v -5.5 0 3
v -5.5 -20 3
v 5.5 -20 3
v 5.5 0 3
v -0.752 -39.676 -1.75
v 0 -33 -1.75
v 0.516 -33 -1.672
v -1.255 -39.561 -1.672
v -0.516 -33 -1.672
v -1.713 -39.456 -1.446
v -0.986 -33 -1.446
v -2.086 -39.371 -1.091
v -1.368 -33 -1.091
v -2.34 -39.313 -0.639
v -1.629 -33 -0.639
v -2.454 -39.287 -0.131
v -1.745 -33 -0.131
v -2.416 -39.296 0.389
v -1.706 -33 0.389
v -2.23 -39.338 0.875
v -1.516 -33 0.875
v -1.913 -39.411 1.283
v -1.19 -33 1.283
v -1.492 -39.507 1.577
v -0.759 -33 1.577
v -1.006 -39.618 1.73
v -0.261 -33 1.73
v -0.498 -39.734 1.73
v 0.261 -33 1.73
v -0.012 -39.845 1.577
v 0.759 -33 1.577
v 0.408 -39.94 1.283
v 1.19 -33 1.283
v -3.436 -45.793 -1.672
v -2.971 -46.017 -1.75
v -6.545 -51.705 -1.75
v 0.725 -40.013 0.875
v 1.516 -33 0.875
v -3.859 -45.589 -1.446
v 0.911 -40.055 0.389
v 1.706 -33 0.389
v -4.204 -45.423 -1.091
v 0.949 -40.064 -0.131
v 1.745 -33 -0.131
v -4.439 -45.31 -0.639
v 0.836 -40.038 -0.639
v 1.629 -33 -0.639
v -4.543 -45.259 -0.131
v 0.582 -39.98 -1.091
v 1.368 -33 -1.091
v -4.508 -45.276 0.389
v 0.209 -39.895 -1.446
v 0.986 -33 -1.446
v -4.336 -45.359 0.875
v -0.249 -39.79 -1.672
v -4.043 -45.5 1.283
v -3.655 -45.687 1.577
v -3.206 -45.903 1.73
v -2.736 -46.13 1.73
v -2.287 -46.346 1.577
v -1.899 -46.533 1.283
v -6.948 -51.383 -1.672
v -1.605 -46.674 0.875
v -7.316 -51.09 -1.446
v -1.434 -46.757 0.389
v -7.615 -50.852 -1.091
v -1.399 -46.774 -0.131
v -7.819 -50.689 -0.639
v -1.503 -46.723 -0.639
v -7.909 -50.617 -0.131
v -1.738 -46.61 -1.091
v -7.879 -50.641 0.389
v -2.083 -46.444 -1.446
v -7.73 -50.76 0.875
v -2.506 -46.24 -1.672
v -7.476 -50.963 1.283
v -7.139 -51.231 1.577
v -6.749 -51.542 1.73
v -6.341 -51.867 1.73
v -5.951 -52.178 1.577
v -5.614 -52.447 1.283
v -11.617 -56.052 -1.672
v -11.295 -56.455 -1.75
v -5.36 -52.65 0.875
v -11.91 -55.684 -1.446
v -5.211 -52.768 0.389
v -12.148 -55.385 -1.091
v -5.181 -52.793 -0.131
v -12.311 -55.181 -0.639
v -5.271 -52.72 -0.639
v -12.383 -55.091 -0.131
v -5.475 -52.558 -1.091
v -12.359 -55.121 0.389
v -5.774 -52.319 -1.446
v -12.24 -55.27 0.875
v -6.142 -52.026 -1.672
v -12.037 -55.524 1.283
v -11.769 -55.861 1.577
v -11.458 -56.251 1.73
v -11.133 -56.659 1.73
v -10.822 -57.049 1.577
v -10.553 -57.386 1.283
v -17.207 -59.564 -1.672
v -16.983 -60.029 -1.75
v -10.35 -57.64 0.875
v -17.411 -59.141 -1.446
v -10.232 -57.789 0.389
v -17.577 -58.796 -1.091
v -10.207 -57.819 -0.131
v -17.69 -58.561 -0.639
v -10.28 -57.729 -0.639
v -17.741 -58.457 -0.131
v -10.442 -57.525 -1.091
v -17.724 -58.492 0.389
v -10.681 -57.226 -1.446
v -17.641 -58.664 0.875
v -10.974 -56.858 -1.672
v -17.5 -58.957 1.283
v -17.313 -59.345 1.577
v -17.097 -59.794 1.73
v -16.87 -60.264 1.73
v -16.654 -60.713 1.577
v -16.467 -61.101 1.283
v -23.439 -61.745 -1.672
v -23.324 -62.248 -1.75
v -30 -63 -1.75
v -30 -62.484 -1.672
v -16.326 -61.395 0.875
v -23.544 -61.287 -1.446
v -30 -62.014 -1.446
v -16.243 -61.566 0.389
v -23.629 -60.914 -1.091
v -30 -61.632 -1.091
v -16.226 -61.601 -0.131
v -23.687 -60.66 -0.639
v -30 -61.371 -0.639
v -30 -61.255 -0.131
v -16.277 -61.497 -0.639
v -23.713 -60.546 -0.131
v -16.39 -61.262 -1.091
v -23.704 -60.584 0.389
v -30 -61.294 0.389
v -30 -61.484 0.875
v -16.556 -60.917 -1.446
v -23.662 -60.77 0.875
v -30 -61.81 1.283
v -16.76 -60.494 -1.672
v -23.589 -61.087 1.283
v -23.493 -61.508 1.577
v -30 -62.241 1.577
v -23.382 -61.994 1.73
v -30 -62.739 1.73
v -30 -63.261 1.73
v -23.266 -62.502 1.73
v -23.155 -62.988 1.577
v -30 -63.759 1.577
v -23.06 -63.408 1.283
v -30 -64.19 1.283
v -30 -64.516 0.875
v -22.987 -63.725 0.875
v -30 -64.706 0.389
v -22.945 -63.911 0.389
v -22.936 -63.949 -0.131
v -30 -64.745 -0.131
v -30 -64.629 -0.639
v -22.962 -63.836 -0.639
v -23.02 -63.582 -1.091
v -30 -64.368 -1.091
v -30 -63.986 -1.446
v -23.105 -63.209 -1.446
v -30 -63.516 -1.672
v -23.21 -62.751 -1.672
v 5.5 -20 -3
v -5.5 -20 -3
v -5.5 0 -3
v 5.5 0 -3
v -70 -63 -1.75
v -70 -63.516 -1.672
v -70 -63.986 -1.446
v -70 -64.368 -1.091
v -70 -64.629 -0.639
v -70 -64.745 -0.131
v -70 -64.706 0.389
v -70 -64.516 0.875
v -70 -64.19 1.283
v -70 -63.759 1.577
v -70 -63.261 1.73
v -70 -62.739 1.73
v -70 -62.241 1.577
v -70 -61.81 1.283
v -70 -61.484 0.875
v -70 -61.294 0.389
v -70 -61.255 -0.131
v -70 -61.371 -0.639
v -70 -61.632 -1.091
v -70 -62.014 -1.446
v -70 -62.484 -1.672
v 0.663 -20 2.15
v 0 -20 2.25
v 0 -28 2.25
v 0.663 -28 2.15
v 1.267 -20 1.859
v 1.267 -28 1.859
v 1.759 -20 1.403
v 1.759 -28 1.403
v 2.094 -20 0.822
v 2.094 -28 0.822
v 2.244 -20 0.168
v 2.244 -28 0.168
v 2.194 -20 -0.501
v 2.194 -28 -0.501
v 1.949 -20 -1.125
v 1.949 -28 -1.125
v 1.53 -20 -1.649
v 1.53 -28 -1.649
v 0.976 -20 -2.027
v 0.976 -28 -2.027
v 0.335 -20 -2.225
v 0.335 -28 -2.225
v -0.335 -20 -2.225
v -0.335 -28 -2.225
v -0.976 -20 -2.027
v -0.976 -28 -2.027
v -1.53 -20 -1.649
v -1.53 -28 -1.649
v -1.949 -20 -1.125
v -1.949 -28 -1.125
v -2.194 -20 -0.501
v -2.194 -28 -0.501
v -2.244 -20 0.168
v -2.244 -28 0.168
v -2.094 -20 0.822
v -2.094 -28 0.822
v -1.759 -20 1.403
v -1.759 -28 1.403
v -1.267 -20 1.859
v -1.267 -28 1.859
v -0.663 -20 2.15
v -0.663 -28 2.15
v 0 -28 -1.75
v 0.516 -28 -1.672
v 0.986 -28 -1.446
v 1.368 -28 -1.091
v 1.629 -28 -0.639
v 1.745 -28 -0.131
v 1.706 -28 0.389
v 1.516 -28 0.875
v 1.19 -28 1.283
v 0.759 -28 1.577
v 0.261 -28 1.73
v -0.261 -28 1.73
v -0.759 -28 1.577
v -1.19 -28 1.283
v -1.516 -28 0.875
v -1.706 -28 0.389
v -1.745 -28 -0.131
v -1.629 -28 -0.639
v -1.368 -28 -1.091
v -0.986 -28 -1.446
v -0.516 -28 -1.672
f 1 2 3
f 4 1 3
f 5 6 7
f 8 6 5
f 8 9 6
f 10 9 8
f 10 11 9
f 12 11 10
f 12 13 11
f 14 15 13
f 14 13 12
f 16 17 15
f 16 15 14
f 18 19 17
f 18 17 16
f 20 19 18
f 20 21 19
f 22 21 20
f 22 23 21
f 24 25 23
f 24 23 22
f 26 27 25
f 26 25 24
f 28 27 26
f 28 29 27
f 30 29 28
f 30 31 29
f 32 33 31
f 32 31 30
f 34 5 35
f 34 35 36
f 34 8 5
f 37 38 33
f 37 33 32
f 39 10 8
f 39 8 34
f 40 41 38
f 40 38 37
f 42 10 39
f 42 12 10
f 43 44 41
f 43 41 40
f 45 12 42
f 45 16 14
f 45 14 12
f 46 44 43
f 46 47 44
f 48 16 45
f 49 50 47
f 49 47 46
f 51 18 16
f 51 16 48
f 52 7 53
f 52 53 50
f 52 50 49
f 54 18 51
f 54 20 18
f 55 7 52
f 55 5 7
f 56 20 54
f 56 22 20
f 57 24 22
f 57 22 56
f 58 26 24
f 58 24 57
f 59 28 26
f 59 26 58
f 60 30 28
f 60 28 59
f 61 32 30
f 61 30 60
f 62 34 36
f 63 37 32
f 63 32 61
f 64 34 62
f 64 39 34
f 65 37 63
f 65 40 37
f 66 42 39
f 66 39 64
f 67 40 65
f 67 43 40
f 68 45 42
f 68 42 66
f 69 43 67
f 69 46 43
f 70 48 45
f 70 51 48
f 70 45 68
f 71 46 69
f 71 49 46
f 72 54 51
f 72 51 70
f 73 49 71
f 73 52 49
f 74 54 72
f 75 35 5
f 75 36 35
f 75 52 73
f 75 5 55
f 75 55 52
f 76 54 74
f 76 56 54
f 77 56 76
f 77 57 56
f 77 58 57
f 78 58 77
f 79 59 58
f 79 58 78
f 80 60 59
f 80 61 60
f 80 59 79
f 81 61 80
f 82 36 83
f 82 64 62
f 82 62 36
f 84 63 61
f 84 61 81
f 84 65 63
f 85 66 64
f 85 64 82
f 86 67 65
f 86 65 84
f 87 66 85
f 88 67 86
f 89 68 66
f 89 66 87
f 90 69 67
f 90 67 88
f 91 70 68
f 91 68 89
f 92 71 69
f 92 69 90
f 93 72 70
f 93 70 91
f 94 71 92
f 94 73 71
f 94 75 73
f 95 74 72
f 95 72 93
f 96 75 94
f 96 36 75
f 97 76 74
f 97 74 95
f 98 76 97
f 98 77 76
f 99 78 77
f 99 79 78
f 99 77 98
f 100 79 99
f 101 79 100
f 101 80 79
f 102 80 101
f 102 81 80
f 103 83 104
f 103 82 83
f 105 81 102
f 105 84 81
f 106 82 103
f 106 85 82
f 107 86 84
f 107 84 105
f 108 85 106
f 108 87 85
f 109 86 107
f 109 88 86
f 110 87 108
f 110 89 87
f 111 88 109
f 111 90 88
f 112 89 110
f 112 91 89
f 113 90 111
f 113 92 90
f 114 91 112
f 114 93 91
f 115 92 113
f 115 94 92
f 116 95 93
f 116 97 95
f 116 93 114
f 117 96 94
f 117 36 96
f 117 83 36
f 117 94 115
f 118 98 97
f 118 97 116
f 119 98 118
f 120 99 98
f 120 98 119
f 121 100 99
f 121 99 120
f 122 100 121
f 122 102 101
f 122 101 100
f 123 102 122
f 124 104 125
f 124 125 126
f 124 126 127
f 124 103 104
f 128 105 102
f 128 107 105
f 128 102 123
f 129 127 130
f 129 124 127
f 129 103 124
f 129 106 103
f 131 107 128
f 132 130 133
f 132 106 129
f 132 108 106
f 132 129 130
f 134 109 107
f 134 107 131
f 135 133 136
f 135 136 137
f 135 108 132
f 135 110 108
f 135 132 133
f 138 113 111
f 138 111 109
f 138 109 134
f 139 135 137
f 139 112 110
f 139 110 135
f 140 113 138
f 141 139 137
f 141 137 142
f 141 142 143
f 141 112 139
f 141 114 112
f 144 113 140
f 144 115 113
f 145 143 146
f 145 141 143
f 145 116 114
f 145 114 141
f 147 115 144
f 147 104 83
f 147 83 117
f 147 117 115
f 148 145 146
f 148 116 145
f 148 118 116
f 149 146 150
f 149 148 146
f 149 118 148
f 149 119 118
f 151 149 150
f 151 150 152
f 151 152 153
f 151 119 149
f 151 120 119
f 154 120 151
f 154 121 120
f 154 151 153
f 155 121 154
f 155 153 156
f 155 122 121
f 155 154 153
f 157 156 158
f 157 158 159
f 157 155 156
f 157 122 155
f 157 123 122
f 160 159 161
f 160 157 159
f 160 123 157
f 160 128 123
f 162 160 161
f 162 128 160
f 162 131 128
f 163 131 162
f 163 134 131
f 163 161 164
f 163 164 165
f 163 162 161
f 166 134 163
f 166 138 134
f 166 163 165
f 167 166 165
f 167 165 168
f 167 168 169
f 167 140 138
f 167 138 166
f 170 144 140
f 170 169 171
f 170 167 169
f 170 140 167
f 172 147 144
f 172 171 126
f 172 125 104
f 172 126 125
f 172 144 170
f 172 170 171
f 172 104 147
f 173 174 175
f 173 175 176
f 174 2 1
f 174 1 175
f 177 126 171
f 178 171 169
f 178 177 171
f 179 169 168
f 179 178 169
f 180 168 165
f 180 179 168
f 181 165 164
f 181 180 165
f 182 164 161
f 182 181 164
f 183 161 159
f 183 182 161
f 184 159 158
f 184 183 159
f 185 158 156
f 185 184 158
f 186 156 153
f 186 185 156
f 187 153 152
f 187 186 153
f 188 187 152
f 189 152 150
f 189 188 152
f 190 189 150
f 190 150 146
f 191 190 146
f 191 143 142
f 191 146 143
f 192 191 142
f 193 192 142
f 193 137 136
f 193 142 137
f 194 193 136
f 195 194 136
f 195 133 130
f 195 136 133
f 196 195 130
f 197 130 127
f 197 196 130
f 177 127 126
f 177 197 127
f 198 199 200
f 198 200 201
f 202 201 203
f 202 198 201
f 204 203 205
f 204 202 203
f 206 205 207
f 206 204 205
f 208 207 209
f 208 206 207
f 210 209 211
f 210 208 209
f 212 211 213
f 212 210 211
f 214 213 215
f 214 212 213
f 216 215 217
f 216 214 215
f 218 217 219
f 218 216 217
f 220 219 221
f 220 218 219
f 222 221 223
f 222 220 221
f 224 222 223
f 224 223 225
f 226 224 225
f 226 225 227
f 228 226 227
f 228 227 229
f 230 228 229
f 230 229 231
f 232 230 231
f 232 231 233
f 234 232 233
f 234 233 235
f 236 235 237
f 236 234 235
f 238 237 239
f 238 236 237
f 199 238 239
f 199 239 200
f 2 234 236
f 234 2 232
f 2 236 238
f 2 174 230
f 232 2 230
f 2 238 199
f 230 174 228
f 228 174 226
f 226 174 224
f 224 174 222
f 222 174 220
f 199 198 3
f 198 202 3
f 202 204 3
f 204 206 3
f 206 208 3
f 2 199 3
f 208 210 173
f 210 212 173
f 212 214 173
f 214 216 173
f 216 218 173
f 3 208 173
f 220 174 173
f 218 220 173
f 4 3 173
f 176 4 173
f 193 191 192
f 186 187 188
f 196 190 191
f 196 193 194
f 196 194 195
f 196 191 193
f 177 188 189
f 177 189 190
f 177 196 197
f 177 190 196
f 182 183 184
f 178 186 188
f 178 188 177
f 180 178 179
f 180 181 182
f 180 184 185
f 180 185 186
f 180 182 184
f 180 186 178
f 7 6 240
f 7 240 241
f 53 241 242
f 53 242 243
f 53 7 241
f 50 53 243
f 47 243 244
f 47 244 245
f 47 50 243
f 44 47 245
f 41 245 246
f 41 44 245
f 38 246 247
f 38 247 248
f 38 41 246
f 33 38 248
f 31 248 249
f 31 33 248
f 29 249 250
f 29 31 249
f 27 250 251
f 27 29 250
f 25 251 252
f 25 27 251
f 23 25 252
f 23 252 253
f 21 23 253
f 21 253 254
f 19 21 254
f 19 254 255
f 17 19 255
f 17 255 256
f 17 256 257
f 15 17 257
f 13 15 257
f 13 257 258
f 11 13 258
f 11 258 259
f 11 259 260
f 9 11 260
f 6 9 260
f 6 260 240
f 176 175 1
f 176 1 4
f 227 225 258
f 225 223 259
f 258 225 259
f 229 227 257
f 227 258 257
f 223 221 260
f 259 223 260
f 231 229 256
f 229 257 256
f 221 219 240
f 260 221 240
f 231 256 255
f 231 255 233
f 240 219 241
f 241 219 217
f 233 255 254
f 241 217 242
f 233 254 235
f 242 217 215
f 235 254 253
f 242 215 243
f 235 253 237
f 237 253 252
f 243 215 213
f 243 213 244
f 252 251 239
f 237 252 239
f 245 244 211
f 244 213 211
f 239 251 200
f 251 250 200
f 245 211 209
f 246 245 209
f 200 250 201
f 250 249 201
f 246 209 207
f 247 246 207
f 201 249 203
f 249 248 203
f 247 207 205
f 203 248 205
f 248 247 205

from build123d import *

# Parameters (mm, degrees)
SKETCH1_W           = 11
SKETCH1_H           = 6
OVERMOULD_DEPTH     = 20
SKETCH2_R           = 2.25
STRAIN_RELIEF_DEPTH = 8
LEAD_PROFILE_R      = 1.75


with BuildPart() as part:
    # Sketch1 → Overmould (new body)
    with BuildSketch(Plane(origin=(0, 0, 0), x_dir=(1, 0, 0), z_dir=(0, 1, 0))):
        Rectangle(SKETCH1_W, SKETCH1_H)
    extrude(amount=-OVERMOULD_DEPTH)

    # Sketch2 → Strain_relief (add)
    with BuildSketch(Plane(origin=(0, -20, 0), x_dir=(1, 0, 0), z_dir=(0, 1, 0))):
        with Locations(Location((0, 0, 0), (0, 0, 270))):
            Circle(SKETCH2_R)
    extrude(amount=-STRAIN_RELIEF_DEPTH)

    # Lead: sweep along a path in Sketch3
    with BuildLine(Plane.XY) as lead_path:
        Line((0, -28), (0, -33))
        ThreePointArc((0, -33), (-8.786796564, -54.213203436), (-30, -63))
        Line((-30, -63), (-70, -63))
    # Lead profile (on start of the path) → Lead (sweep)
    with BuildSketch(Plane(origin=(0, -28, 0), x_dir=(0, 0, -1), z_dir=(0, -1, 0))):
        Circle(LEAD_PROFILE_R)
    sweep(path=lead_path.line)


solid = part.part
